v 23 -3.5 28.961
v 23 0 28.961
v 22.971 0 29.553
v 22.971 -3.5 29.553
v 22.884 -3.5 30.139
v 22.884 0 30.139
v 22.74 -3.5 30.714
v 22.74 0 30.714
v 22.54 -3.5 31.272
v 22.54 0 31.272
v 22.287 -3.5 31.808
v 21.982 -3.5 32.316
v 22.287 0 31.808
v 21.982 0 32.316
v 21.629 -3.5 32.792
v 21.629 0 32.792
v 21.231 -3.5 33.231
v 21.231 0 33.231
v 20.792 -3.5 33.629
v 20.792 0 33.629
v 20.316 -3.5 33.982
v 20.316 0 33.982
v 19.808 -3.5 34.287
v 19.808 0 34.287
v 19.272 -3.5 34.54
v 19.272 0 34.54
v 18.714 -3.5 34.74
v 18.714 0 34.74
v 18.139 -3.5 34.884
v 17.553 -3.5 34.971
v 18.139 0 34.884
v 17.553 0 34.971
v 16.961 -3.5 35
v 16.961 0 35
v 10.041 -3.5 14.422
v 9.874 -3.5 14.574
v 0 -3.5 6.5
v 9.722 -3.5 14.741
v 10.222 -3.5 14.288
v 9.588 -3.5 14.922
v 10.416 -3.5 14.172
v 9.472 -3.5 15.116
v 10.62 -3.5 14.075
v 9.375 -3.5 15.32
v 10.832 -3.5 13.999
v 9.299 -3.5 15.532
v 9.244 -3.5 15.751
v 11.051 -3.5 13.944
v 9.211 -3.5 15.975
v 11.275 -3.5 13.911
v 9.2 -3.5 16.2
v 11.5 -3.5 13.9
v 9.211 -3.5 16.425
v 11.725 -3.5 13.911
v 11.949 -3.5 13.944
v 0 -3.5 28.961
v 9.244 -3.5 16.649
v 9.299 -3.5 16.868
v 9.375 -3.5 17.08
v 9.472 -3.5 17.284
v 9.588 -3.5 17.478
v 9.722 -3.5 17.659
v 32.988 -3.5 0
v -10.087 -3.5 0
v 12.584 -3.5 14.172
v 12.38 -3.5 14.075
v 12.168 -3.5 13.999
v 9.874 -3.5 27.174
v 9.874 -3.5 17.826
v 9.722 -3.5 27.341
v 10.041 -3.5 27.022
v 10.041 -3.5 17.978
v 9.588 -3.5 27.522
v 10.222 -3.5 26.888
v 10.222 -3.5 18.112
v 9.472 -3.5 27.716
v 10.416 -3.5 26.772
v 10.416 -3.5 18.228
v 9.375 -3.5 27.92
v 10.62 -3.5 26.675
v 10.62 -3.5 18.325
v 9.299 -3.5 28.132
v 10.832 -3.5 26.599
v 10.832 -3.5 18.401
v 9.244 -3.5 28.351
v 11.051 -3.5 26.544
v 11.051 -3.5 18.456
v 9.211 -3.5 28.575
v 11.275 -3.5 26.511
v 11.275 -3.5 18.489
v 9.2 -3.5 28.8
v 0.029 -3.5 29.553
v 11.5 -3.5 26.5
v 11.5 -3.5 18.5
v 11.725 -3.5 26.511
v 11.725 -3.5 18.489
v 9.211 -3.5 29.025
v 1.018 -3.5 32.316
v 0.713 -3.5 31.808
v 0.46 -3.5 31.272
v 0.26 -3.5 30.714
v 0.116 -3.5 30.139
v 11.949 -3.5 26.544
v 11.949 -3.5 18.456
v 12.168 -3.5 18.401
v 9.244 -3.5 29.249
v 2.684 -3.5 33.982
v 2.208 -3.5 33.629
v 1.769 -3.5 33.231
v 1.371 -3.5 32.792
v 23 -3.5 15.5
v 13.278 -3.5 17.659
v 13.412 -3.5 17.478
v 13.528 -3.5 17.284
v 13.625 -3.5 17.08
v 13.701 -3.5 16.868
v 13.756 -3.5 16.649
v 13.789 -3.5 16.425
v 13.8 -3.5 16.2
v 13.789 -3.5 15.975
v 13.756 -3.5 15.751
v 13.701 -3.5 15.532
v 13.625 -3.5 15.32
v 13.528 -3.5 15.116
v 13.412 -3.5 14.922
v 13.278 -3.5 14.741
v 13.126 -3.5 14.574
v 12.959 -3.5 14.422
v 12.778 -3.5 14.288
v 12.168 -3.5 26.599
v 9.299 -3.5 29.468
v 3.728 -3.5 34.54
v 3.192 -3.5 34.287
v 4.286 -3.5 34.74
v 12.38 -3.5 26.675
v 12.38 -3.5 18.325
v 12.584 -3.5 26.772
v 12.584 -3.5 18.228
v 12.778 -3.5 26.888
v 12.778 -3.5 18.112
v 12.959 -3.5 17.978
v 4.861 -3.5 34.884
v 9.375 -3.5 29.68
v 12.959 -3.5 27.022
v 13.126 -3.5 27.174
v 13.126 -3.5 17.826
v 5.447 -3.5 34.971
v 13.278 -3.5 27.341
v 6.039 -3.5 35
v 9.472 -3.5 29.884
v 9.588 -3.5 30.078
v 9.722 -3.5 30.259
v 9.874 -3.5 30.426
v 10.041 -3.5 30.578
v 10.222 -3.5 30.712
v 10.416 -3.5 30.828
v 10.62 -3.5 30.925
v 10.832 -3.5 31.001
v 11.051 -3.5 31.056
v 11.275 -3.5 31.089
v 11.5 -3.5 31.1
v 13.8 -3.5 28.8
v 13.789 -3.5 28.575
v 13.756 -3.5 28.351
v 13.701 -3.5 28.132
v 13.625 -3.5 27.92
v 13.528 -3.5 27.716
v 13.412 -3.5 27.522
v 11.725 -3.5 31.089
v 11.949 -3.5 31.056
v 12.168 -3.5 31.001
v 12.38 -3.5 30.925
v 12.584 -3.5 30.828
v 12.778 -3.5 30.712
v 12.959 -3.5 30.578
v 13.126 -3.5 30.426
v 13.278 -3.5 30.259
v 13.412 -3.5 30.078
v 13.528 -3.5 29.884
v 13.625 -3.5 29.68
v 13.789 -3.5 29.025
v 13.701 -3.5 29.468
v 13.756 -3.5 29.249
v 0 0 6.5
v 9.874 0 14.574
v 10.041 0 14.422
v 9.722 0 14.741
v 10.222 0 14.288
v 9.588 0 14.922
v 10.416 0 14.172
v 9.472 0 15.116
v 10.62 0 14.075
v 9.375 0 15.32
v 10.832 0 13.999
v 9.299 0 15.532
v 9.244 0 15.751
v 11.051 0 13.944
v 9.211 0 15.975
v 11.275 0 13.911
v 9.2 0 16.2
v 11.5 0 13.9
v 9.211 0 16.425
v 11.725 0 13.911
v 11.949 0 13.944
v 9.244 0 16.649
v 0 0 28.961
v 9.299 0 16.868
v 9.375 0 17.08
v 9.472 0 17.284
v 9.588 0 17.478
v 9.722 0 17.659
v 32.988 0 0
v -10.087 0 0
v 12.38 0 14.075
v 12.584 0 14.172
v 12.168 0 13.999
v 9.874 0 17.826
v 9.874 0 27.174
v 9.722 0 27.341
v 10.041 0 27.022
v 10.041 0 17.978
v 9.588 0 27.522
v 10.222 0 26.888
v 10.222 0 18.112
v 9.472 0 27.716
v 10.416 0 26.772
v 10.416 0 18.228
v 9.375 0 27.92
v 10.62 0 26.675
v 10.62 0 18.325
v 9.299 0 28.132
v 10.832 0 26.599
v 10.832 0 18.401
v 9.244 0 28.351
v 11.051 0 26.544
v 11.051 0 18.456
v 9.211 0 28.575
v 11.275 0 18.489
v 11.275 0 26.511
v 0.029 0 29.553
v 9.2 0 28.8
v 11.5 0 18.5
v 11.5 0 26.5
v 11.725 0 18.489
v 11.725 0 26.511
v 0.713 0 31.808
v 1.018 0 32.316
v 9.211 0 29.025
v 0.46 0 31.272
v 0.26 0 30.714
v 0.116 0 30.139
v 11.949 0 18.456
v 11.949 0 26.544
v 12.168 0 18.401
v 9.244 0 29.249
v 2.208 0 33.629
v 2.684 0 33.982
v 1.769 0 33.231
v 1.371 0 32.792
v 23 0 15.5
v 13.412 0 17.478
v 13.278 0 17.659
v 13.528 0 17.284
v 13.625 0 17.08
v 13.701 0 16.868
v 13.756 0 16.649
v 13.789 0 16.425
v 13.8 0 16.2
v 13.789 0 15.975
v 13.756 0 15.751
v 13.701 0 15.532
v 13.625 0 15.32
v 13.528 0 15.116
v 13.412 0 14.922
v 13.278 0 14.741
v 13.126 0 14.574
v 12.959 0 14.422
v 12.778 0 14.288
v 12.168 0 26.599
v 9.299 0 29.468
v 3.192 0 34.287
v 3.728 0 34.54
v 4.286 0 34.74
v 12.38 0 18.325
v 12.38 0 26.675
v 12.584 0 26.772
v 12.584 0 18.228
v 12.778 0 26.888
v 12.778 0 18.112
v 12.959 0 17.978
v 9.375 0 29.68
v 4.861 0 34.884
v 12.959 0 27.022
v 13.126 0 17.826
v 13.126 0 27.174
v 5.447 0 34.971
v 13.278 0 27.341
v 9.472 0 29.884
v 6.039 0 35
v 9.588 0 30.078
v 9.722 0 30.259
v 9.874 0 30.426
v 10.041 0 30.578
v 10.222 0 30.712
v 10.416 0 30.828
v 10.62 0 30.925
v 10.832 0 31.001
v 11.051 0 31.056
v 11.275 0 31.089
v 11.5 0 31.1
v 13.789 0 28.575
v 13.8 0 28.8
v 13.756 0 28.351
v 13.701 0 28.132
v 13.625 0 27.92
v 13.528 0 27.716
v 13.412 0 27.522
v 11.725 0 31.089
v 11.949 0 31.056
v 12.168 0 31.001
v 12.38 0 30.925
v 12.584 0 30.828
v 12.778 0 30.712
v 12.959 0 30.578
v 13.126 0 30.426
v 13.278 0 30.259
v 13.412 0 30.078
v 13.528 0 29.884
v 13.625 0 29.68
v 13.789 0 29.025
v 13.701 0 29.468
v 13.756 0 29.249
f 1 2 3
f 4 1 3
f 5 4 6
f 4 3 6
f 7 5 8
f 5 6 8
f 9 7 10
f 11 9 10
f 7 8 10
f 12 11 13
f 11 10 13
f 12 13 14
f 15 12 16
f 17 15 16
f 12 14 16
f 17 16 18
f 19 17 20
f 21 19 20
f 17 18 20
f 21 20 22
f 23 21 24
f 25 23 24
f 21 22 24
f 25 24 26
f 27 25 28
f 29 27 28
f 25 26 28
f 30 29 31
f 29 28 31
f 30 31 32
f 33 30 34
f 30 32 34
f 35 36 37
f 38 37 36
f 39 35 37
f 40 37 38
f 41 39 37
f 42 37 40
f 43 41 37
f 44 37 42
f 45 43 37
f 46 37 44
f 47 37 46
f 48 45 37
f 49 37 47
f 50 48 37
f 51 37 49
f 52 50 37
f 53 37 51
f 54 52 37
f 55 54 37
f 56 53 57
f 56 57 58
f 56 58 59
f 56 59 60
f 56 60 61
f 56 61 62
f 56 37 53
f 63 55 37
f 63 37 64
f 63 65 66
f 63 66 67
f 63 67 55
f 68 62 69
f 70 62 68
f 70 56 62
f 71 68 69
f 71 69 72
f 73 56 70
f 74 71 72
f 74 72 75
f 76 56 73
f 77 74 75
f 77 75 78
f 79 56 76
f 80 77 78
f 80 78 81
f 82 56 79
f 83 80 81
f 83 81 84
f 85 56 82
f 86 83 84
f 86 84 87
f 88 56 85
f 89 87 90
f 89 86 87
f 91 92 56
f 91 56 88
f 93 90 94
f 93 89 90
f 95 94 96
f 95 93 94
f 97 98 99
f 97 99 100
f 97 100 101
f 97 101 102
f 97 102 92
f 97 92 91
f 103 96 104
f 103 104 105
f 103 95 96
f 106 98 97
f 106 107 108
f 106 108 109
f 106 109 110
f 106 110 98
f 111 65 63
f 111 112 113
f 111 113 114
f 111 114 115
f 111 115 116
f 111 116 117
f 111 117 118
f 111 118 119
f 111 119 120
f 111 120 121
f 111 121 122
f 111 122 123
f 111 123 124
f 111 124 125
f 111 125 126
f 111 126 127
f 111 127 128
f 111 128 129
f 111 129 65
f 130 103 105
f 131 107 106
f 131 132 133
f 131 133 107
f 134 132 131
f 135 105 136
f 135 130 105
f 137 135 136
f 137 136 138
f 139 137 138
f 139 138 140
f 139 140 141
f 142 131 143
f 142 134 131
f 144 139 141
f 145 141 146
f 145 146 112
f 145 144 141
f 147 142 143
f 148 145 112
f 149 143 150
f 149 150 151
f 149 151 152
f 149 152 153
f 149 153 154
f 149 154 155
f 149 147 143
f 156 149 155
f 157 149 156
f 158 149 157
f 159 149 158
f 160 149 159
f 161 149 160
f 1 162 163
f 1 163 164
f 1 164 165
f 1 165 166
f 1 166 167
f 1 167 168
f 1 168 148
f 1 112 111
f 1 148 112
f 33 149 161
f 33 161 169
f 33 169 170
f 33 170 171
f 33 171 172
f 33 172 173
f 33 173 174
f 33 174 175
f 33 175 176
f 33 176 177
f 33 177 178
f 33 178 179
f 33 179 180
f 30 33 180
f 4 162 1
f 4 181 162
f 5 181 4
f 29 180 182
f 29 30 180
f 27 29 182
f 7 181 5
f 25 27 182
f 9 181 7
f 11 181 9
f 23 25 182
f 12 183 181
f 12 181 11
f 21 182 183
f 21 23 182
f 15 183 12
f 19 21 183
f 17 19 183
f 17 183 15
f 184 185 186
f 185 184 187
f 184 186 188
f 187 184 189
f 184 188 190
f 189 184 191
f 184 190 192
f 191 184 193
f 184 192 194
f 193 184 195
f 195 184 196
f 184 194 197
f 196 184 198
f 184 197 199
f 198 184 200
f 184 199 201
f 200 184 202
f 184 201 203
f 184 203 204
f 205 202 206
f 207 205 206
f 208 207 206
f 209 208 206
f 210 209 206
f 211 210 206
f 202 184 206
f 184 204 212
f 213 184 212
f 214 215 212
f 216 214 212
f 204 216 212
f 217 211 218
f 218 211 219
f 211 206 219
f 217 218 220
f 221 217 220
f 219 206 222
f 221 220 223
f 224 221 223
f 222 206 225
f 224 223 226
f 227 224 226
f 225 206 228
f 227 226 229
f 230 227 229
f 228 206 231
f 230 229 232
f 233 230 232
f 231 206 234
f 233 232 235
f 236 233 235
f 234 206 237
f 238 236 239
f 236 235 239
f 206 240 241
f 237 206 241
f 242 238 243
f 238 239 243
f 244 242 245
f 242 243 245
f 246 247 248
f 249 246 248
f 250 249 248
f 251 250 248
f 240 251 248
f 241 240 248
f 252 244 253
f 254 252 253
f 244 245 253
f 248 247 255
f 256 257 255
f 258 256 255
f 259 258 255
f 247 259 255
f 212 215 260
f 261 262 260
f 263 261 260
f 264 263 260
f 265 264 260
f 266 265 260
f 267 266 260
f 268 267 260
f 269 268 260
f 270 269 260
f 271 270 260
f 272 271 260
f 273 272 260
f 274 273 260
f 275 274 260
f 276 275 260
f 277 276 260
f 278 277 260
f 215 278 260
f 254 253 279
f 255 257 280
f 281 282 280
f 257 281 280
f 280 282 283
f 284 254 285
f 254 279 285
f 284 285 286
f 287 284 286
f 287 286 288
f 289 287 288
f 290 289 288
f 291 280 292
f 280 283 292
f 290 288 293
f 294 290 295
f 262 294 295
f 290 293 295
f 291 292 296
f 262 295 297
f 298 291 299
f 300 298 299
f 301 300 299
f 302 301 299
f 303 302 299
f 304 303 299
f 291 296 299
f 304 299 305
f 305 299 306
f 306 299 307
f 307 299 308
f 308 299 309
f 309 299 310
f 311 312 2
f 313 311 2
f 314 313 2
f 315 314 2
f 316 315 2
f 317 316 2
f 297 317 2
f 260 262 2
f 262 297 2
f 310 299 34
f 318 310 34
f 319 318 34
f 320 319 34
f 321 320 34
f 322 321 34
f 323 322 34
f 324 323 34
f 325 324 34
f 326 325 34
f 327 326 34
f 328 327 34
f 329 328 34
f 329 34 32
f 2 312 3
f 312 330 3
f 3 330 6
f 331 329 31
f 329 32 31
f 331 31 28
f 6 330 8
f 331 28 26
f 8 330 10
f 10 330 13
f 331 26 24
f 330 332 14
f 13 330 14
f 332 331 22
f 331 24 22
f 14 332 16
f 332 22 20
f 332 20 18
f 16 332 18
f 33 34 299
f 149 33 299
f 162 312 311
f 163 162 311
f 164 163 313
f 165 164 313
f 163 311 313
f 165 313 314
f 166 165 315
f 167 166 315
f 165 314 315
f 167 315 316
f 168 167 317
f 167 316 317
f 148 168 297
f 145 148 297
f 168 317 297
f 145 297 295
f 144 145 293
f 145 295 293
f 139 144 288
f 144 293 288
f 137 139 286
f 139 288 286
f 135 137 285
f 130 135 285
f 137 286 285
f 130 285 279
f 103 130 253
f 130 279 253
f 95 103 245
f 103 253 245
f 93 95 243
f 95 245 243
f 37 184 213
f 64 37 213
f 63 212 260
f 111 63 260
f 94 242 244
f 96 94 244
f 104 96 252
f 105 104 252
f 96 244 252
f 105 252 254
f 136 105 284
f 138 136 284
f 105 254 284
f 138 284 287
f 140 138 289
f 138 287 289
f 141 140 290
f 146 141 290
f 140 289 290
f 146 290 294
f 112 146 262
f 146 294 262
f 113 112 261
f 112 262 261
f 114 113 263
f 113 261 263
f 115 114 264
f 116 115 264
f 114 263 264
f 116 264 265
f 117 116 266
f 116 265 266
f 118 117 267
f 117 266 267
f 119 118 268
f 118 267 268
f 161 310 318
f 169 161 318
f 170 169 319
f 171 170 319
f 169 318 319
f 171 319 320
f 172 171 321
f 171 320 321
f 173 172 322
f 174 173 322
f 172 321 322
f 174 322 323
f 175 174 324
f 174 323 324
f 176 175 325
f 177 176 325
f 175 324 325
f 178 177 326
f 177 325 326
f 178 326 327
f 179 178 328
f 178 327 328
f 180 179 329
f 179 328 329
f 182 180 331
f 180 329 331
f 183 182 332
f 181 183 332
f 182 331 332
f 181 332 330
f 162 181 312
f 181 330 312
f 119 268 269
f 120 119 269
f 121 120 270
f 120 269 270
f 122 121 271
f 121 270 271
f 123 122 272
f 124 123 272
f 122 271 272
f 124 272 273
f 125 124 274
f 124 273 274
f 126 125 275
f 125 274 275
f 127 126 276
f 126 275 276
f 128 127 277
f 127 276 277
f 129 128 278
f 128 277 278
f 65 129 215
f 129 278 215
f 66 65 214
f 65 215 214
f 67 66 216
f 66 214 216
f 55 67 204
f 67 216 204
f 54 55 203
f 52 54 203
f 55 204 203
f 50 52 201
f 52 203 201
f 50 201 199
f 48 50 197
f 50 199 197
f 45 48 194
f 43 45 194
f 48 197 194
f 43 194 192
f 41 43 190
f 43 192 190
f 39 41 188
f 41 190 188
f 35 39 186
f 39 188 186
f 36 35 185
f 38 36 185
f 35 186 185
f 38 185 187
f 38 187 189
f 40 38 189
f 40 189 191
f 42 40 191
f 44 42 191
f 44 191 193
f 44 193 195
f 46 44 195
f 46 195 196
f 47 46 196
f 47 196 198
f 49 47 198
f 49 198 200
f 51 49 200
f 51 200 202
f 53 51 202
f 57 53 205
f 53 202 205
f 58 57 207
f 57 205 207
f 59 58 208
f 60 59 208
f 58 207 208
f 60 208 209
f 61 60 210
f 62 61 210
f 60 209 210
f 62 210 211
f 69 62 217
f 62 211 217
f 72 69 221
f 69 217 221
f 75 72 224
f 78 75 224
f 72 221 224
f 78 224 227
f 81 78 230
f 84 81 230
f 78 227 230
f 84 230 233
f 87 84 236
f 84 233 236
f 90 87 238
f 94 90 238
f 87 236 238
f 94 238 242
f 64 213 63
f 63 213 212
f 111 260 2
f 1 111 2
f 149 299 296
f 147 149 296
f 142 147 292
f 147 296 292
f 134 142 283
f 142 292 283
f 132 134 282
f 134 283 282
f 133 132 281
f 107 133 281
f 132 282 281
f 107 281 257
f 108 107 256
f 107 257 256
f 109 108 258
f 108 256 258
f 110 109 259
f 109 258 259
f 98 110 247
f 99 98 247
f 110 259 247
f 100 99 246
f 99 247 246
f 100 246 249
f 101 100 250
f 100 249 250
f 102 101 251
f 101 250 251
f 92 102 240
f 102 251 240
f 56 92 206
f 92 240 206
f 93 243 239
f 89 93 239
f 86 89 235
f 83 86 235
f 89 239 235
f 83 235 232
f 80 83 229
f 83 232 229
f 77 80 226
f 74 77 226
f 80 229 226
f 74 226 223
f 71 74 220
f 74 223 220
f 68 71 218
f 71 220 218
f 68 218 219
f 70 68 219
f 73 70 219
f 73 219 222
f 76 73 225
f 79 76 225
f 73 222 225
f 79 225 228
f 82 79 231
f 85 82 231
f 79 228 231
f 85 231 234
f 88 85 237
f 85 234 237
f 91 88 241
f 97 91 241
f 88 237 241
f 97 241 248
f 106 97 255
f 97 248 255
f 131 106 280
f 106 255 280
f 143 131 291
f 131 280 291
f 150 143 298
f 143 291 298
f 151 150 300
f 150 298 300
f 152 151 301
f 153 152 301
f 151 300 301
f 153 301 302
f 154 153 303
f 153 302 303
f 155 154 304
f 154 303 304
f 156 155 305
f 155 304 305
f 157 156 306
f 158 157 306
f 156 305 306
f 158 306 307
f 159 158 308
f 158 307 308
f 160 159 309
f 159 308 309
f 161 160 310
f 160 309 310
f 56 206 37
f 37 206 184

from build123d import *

# Parameters (mm, degrees)
F1_DEPTH = 3.5


with BuildPart() as f1:
    # F0 (on Front) → F1 (new body)
    with BuildSketch(Plane.XZ):
        with BuildLine():
            Line((0, 6.5), (0, 0))
            Line((0, 0), (23, 0))
            Line((23, 0), (23, 15.5))
            Line((23, 15.5), (23, 28.961353))
            ThreePointArc((23, 28.961353), (21.231321, 33.231321), (16.961353, 35))
            Line((16.961353, 35), (11.5, 35))
            Line((11.5, 35), (6.038647, 35))
            ThreePointArc((6.038647, 35), (1.768679, 33.231321), (0, 28.961353))
            Line((0, 28.961353), (0, 6.5))
        make_face()
        with BuildLine():
            ThreePointArc((13.8, 16.2), (9.873654, 14.573654), (11.5, 18.5))
            ThreePointArc((11.5, 18.5), (13.126346, 17.826346), (13.8, 16.2))
        make_face(mode=Mode.SUBTRACT)
        with BuildLine():
            ThreePointArc((11.5, 26.5), (9.2, 28.8), (11.5, 31.1))
            ThreePointArc((11.5, 31.1), (13.126346, 30.426346), (13.8, 28.8))
            ThreePointArc((13.8, 28.8), (13.126346, 27.173654), (11.5, 26.5))
        make_face(mode=Mode.SUBTRACT)
        Polygon((23, 15.5), (23, 0), (32.987984, 0), align=None)
        Polygon((-10.087121, 0), (0, 0), (0, 6.5), align=None)
    extrude(amount=F1_DEPTH)


solid = f1.part
